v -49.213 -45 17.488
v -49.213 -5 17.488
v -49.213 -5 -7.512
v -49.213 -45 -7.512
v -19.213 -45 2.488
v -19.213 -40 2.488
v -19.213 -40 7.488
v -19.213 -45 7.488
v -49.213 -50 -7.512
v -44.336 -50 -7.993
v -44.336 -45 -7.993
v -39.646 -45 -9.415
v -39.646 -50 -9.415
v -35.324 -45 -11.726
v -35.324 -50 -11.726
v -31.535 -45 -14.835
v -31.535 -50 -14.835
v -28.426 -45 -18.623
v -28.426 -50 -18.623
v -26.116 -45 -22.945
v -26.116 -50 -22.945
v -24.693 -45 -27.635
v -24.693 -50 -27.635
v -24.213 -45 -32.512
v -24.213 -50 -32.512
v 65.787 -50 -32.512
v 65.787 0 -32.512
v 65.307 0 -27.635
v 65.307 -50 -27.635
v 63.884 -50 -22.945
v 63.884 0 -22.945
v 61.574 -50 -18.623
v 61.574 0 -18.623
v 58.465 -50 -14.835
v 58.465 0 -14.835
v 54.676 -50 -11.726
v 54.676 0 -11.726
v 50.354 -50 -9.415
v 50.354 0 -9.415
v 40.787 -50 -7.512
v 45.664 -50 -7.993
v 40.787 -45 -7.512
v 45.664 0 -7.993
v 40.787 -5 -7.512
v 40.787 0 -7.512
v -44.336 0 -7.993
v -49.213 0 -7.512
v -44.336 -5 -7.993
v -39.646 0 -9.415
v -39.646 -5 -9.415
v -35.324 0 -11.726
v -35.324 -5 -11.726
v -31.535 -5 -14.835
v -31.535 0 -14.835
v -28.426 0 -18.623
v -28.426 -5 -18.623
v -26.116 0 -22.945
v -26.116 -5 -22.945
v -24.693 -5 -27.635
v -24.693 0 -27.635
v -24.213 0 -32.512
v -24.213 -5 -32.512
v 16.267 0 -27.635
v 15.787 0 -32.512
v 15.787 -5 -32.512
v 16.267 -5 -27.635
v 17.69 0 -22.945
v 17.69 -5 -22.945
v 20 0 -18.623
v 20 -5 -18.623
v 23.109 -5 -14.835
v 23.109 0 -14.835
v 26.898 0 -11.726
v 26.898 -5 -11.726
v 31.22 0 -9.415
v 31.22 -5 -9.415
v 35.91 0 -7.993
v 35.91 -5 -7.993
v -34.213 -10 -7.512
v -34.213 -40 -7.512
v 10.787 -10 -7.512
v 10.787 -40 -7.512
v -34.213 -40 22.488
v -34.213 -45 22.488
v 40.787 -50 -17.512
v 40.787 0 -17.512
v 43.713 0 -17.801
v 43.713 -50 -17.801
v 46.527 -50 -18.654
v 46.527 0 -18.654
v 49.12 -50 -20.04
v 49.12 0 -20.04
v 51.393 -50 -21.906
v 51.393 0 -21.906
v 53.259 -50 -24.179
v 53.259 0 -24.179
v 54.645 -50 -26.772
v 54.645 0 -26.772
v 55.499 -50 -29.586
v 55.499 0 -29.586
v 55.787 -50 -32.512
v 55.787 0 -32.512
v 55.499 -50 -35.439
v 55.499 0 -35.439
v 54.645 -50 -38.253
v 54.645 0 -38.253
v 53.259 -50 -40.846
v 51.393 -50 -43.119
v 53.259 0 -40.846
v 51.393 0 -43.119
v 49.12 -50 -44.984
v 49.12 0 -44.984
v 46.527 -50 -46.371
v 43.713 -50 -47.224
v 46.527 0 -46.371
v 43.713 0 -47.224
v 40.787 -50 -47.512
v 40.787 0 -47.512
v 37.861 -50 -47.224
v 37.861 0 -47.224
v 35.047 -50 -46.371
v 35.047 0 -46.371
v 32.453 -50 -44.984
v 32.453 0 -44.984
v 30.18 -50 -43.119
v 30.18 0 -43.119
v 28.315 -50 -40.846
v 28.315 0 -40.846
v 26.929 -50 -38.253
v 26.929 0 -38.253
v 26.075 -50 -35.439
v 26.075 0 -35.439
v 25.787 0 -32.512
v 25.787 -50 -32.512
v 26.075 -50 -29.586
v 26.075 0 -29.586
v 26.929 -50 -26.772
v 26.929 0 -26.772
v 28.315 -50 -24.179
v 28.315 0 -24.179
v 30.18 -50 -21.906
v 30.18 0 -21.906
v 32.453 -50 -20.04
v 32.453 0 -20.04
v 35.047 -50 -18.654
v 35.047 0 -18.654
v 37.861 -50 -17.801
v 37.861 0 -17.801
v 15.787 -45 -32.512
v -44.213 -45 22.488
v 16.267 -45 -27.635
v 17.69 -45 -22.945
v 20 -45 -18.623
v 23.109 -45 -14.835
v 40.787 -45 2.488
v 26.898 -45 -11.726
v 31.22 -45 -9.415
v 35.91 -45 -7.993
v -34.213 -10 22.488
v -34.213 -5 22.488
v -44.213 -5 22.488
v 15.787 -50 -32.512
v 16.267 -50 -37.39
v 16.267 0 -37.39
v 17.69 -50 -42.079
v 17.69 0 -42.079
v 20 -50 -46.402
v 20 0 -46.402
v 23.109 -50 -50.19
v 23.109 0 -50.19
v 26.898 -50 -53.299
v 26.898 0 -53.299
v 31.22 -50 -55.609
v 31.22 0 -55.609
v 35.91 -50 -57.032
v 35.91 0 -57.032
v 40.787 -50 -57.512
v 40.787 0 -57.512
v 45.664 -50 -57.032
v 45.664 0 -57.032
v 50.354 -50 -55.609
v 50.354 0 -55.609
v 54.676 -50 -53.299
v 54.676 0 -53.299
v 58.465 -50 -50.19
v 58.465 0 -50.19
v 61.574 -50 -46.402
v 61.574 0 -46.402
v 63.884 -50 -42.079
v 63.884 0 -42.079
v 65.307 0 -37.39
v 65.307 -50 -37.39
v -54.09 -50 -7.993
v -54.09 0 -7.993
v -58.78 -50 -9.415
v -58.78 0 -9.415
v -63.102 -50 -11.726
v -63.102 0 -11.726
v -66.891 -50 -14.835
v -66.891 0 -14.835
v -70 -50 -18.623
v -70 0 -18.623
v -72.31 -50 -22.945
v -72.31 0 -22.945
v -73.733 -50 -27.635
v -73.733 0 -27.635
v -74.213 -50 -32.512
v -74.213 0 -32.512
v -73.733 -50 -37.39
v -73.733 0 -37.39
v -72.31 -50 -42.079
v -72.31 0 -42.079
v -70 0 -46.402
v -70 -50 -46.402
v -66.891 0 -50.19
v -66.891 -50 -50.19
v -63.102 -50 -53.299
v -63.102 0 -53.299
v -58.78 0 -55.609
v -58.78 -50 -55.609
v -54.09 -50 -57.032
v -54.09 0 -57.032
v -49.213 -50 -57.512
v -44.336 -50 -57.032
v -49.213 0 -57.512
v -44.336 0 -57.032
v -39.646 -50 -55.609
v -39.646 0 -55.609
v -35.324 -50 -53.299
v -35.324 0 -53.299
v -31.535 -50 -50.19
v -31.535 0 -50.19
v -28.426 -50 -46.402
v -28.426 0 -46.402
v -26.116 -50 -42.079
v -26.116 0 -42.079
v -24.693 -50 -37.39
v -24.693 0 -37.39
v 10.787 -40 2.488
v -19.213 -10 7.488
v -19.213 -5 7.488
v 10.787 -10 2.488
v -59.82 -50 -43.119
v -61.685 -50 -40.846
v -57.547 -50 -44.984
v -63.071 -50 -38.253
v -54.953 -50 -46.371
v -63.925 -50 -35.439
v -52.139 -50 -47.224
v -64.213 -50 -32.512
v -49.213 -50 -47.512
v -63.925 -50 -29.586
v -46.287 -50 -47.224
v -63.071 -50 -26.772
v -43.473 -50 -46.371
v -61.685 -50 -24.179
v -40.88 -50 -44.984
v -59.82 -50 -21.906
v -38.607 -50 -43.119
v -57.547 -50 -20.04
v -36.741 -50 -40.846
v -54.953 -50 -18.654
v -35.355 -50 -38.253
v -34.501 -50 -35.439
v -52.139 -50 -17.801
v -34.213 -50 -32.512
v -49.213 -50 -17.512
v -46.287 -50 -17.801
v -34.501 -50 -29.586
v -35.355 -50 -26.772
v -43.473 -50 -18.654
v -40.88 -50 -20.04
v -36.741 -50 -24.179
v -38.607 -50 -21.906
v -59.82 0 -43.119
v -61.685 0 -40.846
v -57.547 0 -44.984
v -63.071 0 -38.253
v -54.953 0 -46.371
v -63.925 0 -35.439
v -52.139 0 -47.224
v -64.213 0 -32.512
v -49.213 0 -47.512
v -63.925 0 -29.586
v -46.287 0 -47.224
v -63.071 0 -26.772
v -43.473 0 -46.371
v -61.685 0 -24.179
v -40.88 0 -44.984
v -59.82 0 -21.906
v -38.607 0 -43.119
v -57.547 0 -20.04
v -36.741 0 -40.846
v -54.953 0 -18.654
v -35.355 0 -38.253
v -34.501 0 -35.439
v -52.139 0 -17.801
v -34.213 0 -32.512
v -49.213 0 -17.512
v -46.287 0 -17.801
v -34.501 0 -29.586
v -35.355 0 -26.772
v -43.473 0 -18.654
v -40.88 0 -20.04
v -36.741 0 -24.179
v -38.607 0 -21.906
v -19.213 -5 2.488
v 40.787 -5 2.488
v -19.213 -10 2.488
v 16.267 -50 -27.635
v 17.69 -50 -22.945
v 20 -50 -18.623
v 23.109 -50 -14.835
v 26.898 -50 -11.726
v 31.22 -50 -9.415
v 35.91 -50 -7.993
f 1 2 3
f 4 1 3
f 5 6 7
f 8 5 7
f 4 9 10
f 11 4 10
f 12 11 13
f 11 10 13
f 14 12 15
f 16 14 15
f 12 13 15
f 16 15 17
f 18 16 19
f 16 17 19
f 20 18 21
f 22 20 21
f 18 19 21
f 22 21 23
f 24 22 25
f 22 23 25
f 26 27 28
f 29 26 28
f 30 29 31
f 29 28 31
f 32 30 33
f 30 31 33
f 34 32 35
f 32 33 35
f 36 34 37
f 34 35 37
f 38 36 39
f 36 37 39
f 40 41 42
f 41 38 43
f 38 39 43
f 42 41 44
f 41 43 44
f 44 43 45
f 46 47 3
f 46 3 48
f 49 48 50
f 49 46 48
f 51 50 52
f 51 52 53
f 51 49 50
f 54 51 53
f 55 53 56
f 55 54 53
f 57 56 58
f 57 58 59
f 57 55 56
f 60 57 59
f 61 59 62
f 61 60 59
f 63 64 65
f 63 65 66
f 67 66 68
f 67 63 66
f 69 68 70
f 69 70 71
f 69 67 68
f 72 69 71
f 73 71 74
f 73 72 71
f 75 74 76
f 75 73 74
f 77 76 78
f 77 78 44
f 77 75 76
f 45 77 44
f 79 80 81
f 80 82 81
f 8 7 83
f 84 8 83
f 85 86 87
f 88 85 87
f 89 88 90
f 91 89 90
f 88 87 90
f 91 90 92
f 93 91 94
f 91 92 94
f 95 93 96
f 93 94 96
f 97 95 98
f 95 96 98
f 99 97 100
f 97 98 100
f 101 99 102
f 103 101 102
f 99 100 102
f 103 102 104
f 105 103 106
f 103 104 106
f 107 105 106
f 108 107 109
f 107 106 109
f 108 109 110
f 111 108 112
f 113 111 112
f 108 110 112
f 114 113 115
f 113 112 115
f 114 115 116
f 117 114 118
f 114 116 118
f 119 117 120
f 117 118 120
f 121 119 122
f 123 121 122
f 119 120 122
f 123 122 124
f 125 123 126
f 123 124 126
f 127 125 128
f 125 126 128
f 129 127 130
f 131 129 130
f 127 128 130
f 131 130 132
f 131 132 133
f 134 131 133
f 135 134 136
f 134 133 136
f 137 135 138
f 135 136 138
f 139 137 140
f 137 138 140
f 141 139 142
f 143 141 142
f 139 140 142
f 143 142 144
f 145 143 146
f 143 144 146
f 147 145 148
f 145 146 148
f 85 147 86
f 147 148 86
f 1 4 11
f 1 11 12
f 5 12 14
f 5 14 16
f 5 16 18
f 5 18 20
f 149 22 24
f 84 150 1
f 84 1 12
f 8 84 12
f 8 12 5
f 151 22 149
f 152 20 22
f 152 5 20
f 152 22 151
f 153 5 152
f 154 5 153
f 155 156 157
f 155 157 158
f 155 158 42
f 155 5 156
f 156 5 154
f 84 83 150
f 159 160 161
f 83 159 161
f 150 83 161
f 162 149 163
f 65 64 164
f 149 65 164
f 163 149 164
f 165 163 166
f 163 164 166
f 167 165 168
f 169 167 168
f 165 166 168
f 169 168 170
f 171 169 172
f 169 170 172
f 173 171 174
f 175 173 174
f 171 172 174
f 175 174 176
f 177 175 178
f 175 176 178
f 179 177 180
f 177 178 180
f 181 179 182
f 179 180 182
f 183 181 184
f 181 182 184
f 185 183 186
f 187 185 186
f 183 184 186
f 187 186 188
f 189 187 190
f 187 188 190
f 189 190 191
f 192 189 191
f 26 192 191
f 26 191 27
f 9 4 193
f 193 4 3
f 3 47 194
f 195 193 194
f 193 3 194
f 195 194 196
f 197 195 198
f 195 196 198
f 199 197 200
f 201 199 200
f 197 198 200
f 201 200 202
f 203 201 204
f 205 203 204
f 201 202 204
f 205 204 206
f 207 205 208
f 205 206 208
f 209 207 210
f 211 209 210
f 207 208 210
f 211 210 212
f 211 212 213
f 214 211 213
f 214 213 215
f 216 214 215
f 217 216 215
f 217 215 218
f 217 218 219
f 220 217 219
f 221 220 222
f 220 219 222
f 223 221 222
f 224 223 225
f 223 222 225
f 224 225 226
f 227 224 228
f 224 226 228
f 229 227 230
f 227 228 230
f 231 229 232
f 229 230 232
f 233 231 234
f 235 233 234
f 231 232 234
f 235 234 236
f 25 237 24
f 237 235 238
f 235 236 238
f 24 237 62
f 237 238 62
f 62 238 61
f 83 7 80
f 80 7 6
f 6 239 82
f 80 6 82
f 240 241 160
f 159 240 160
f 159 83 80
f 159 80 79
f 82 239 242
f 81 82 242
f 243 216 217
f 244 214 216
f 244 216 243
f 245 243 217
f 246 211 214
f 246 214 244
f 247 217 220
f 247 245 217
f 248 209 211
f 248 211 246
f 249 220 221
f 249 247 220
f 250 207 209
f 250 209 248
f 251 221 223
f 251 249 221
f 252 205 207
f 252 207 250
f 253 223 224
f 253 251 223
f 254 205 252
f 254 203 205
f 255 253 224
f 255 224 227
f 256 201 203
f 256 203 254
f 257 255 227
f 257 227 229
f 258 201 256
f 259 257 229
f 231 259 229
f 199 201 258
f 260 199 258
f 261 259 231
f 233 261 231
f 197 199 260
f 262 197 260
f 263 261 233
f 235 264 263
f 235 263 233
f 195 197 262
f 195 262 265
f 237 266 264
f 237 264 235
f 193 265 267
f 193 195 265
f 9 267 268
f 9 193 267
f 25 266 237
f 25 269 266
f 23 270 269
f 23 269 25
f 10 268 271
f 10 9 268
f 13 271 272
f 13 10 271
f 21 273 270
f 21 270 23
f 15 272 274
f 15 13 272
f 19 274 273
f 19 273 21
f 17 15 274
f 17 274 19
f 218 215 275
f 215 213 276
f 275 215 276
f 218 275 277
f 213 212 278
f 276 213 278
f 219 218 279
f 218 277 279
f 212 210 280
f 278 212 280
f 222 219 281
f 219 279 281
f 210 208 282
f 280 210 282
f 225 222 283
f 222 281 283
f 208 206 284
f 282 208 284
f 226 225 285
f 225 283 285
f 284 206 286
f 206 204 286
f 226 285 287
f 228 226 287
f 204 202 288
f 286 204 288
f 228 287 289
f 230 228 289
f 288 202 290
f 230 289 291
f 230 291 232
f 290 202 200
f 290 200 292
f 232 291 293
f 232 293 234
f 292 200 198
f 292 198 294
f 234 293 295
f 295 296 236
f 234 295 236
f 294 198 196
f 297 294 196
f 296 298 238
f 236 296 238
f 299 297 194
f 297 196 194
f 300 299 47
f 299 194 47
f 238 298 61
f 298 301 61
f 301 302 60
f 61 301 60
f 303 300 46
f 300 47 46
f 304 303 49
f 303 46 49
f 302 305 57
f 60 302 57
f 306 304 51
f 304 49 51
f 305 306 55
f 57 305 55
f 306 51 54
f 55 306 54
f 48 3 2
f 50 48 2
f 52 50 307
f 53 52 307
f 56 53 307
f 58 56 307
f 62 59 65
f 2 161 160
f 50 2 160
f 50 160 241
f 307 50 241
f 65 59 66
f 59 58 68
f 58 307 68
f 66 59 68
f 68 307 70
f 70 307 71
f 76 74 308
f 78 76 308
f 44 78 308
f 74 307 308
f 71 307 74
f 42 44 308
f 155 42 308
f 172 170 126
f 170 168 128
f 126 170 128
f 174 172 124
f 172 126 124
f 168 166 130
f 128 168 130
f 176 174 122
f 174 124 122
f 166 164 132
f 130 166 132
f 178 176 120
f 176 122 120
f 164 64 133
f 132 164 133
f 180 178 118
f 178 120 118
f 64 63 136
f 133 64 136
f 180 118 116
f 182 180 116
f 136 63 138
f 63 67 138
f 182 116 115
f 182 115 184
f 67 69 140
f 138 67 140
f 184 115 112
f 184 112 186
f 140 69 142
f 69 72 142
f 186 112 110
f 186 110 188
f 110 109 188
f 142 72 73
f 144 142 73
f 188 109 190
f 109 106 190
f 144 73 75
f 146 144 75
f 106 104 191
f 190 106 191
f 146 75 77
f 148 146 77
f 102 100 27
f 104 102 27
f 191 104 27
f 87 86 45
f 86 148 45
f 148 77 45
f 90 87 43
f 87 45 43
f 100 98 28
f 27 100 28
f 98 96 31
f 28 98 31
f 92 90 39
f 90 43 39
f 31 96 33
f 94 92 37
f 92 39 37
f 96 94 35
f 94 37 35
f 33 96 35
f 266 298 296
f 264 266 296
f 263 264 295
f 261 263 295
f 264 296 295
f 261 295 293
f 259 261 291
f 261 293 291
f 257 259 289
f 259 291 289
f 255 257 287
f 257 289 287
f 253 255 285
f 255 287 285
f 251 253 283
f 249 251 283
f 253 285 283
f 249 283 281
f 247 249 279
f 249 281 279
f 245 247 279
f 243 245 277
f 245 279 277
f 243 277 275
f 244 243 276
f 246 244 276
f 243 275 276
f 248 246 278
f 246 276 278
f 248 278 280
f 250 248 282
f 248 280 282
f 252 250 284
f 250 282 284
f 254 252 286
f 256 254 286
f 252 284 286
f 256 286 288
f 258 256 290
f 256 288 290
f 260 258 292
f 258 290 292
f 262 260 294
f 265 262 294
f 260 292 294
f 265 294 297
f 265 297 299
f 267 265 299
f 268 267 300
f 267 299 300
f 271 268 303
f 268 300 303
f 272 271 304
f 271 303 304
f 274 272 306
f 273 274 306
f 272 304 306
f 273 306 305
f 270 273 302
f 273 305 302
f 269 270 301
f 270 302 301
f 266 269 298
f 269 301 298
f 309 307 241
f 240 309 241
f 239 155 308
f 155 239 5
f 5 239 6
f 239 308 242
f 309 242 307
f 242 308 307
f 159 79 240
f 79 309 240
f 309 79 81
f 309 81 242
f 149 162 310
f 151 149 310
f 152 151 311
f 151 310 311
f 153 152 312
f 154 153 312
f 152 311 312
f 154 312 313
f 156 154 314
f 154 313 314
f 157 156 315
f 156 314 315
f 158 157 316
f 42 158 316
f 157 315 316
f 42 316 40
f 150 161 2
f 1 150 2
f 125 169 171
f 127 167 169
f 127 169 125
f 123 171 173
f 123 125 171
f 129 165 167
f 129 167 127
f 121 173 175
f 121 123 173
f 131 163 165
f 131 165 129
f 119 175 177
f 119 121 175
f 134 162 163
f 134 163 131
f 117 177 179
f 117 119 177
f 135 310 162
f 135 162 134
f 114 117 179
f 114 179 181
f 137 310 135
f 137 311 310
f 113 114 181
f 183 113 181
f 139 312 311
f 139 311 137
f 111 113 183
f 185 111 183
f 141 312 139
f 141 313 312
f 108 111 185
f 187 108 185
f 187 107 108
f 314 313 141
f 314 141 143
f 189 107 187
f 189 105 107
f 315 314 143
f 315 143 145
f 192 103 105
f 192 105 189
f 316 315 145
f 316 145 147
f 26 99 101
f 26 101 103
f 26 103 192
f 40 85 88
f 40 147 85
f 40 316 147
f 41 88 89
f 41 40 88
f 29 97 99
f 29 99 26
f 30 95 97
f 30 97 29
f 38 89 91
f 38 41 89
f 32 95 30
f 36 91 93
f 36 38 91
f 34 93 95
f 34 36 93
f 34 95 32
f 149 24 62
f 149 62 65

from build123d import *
from build123d import SkipClean  # not in build123d's __all__

# Parameters (mm, degrees)
F1_DEPTH = 50
F2_DEPTH = 5
F4_DEPTH = 5
F5_W     = 30
F5_H     = 30
F6_DEPTH = 10
F7_W     = 30
F7_H     = 20.1446080953
F8_DEPTH = 15


with BuildPart() as f1:
    # F0 (on Front) → F1 (new body)
    with BuildSketch(Plane.XZ):
        with BuildLine():
            Line((-34.2131151259, 22.4876786768), (-44.2131151259, 22.4876786768))
            Line((-44.2131151259, 22.4876786768), (-49.2131151259, 17.4876786768))
            Line((-49.2131151259, 17.4876786768), (-49.2131151259, -7.5123213232))
            ThreePointArc((-49.2131151259, -7.5123213232), (-31.5354455962, -14.8346517935), (-24.2131151259, -32.5123213232))
            Line((-24.2131151259, -32.5123213232), (15.7868848741, -32.5123213232))
            ThreePointArc((15.7868848741, -32.5123213232), (23.1092153444, -14.8346517935), (40.7868848741, -7.5123213232))
            Line((40.7868848741, -7.5123213232), (40.7868848741, 2.4876786768))
            Line((40.7868848741, 2.4876786768), (-19.2131151259, 2.4876786768))
            Line((-19.2131151259, 2.4876786768), (-19.2131151259, 7.4876786768))
            Line((-19.2131151259, 7.4876786768), (-34.2131151259, 22.4876786768))
        make_face()
        with BuildLine():
            Line((-49.2131151259, -17.5123213232), (-49.2131151259, -7.5123213232))
            ThreePointArc((-49.2131151259, -7.5123213232), (-66.8907846556, -50.1899908528), (-24.2131151259, -32.5123213232))
            Line((-24.2131151259, -32.5123213232), (-34.2131151259, -32.5123213232))
            ThreePointArc((-34.2131151259, -32.5123213232), (-59.8197168437, -43.118923041), (-49.2131151259, -17.5123213232))
        make_face()
        with BuildLine():
            ThreePointArc((-24.2131151259, -32.5123213232), (-31.5354455962, -14.8346517935), (-49.2131151259, -7.5123213232))
            Line((-49.2131151259, -7.5123213232), (-49.2131151259, -17.5123213232))
            ThreePointArc((-49.2131151259, -17.5123213232), (-38.6065134081, -21.9057196054), (-34.2131151259, -32.5123213232))
            Line((-34.2131151259, -32.5123213232), (-24.2131151259, -32.5123213232))
        make_face()
        with BuildLine():
            ThreePointArc((40.7868848741, -7.5123213232), (23.1092153444, -14.8346517935), (15.7868848741, -32.5123213232))
            Line((15.7868848741, -32.5123213232), (25.7868848741, -32.5123213232))
            ThreePointArc((25.7868848741, -32.5123213232), (30.1802831563, -21.9057196054), (40.7868848741, -17.5123213232))
            Line((40.7868848741, -17.5123213232), (40.7868848741, -7.5123213232))
        make_face()
        with BuildLine():
            Line((25.7868848741, -32.5123213232), (15.7868848741, -32.5123213232))
            ThreePointArc((15.7868848741, -32.5123213232), (40.7868848741, -57.5123213232), (65.7868848741, -32.5123213232))
            ThreePointArc((65.7868848741, -32.5123213232), (58.4645544038, -14.8346517935), (40.7868848741, -7.5123213232))
            Line((40.7868848741, -7.5123213232), (40.7868848741, -17.5123213232))
            ThreePointArc((40.7868848741, -17.5123213232), (51.3934865919, -21.9057196054), (55.7868848741, -32.5123213232))
            ThreePointArc((55.7868848741, -32.5123213232), (40.7868848741, -47.5123213232), (25.7868848741, -32.5123213232))
        make_face()
    extrude(amount=F1_DEPTH)

    # F0 (on Front) → F2 (cut)
    with BuildSketch(Plane.XZ):
        with BuildLine():
            Line((-34.2131151259, 22.4876786768), (-44.2131151259, 22.4876786768))
            Line((-44.2131151259, 22.4876786768), (-49.2131151259, 17.4876786768))
            Line((-49.2131151259, 17.4876786768), (-49.2131151259, -7.5123213232))
            ThreePointArc((-49.2131151259, -7.5123213232), (-31.5354455962, -14.8346517935), (-24.2131151259, -32.5123213232))
            Line((-24.2131151259, -32.5123213232), (15.7868848741, -32.5123213232))
            ThreePointArc((15.7868848741, -32.5123213232), (23.1092153444, -14.8346517935), (40.7868848741, -7.5123213232))
            Line((40.7868848741, -7.5123213232), (40.7868848741, 2.4876786768))
            Line((40.7868848741, 2.4876786768), (-19.2131151259, 2.4876786768))
            Line((-19.2131151259, 2.4876786768), (-19.2131151259, 7.4876786768))
            Line((-19.2131151259, 7.4876786768), (-34.2131151259, 22.4876786768))
        make_face()
    extrude(amount=F2_DEPTH, mode=Mode.SUBTRACT)

    # F3 (on face) → F4 (cut)
    with BuildSketch(Plane.XZ.offset(50)):
        with BuildLine():
            Line((-34.2131151259, 22.4876786768), (-44.2131151259, 22.4876786768))
            Line((-44.2131151259, 22.4876786768), (-49.2131151259, 17.4876786768))
            Line((-49.2131151259, 17.4876786768), (-49.2131151259, -7.5123213232))
            ThreePointArc((-49.2131151259, -7.5123213232), (-31.5354455962, -14.8346517935), (-24.2131151259, -32.5123213232))
            Line((-24.2131151259, -32.5123213232), (15.7868848741, -32.5123213232))
            ThreePointArc((15.7868848741, -32.5123213232), (23.1092153444, -14.8346517935), (40.7868848741, -7.5123213232))
            Line((40.7868848741, -7.5123213232), (40.7868848741, 2.4876786768))
            Line((40.7868848741, 2.4876786768), (-19.2131151259, 2.4876786768))
            Line((-19.2131151259, 2.4876786768), (-19.2131151259, 7.4876786768))
            Line((-19.2131151259, 7.4876786768), (-34.2131151259, 22.4876786768))
        make_face()
    with SkipClean():  # cleaning this boolean's faces spoils the solid; the shape is the same uncleaned
        extrude(amount=-F4_DEPTH, mode=Mode.SUBTRACT)

    # F5 (on face) → F6 (cut)
    with BuildSketch(Plane.XY.offset(2.4876786768)):
        with Locations((-4.2131151259, -25)):
            Rectangle(F5_W, F5_H)
    extrude(amount=-F6_DEPTH, mode=Mode.SUBTRACT)

    # F7 (on face) → F8 (cut)
    with BuildSketch(Plane.YZ.offset(-19.2131151259)):
        Polygon((-40, 2.4876786768), (-40, -7.5123213232), (-10, -7.5123213232), (-10, 2.4876786768), (-10, 7.4876786768), (-40, 7.4876786768), align=None)
        with Locations((-25, 17.5599827245)):
            Rectangle(F7_W, F7_H)
    extrude(amount=-F8_DEPTH, mode=Mode.SUBTRACT)


solid = f1.part
